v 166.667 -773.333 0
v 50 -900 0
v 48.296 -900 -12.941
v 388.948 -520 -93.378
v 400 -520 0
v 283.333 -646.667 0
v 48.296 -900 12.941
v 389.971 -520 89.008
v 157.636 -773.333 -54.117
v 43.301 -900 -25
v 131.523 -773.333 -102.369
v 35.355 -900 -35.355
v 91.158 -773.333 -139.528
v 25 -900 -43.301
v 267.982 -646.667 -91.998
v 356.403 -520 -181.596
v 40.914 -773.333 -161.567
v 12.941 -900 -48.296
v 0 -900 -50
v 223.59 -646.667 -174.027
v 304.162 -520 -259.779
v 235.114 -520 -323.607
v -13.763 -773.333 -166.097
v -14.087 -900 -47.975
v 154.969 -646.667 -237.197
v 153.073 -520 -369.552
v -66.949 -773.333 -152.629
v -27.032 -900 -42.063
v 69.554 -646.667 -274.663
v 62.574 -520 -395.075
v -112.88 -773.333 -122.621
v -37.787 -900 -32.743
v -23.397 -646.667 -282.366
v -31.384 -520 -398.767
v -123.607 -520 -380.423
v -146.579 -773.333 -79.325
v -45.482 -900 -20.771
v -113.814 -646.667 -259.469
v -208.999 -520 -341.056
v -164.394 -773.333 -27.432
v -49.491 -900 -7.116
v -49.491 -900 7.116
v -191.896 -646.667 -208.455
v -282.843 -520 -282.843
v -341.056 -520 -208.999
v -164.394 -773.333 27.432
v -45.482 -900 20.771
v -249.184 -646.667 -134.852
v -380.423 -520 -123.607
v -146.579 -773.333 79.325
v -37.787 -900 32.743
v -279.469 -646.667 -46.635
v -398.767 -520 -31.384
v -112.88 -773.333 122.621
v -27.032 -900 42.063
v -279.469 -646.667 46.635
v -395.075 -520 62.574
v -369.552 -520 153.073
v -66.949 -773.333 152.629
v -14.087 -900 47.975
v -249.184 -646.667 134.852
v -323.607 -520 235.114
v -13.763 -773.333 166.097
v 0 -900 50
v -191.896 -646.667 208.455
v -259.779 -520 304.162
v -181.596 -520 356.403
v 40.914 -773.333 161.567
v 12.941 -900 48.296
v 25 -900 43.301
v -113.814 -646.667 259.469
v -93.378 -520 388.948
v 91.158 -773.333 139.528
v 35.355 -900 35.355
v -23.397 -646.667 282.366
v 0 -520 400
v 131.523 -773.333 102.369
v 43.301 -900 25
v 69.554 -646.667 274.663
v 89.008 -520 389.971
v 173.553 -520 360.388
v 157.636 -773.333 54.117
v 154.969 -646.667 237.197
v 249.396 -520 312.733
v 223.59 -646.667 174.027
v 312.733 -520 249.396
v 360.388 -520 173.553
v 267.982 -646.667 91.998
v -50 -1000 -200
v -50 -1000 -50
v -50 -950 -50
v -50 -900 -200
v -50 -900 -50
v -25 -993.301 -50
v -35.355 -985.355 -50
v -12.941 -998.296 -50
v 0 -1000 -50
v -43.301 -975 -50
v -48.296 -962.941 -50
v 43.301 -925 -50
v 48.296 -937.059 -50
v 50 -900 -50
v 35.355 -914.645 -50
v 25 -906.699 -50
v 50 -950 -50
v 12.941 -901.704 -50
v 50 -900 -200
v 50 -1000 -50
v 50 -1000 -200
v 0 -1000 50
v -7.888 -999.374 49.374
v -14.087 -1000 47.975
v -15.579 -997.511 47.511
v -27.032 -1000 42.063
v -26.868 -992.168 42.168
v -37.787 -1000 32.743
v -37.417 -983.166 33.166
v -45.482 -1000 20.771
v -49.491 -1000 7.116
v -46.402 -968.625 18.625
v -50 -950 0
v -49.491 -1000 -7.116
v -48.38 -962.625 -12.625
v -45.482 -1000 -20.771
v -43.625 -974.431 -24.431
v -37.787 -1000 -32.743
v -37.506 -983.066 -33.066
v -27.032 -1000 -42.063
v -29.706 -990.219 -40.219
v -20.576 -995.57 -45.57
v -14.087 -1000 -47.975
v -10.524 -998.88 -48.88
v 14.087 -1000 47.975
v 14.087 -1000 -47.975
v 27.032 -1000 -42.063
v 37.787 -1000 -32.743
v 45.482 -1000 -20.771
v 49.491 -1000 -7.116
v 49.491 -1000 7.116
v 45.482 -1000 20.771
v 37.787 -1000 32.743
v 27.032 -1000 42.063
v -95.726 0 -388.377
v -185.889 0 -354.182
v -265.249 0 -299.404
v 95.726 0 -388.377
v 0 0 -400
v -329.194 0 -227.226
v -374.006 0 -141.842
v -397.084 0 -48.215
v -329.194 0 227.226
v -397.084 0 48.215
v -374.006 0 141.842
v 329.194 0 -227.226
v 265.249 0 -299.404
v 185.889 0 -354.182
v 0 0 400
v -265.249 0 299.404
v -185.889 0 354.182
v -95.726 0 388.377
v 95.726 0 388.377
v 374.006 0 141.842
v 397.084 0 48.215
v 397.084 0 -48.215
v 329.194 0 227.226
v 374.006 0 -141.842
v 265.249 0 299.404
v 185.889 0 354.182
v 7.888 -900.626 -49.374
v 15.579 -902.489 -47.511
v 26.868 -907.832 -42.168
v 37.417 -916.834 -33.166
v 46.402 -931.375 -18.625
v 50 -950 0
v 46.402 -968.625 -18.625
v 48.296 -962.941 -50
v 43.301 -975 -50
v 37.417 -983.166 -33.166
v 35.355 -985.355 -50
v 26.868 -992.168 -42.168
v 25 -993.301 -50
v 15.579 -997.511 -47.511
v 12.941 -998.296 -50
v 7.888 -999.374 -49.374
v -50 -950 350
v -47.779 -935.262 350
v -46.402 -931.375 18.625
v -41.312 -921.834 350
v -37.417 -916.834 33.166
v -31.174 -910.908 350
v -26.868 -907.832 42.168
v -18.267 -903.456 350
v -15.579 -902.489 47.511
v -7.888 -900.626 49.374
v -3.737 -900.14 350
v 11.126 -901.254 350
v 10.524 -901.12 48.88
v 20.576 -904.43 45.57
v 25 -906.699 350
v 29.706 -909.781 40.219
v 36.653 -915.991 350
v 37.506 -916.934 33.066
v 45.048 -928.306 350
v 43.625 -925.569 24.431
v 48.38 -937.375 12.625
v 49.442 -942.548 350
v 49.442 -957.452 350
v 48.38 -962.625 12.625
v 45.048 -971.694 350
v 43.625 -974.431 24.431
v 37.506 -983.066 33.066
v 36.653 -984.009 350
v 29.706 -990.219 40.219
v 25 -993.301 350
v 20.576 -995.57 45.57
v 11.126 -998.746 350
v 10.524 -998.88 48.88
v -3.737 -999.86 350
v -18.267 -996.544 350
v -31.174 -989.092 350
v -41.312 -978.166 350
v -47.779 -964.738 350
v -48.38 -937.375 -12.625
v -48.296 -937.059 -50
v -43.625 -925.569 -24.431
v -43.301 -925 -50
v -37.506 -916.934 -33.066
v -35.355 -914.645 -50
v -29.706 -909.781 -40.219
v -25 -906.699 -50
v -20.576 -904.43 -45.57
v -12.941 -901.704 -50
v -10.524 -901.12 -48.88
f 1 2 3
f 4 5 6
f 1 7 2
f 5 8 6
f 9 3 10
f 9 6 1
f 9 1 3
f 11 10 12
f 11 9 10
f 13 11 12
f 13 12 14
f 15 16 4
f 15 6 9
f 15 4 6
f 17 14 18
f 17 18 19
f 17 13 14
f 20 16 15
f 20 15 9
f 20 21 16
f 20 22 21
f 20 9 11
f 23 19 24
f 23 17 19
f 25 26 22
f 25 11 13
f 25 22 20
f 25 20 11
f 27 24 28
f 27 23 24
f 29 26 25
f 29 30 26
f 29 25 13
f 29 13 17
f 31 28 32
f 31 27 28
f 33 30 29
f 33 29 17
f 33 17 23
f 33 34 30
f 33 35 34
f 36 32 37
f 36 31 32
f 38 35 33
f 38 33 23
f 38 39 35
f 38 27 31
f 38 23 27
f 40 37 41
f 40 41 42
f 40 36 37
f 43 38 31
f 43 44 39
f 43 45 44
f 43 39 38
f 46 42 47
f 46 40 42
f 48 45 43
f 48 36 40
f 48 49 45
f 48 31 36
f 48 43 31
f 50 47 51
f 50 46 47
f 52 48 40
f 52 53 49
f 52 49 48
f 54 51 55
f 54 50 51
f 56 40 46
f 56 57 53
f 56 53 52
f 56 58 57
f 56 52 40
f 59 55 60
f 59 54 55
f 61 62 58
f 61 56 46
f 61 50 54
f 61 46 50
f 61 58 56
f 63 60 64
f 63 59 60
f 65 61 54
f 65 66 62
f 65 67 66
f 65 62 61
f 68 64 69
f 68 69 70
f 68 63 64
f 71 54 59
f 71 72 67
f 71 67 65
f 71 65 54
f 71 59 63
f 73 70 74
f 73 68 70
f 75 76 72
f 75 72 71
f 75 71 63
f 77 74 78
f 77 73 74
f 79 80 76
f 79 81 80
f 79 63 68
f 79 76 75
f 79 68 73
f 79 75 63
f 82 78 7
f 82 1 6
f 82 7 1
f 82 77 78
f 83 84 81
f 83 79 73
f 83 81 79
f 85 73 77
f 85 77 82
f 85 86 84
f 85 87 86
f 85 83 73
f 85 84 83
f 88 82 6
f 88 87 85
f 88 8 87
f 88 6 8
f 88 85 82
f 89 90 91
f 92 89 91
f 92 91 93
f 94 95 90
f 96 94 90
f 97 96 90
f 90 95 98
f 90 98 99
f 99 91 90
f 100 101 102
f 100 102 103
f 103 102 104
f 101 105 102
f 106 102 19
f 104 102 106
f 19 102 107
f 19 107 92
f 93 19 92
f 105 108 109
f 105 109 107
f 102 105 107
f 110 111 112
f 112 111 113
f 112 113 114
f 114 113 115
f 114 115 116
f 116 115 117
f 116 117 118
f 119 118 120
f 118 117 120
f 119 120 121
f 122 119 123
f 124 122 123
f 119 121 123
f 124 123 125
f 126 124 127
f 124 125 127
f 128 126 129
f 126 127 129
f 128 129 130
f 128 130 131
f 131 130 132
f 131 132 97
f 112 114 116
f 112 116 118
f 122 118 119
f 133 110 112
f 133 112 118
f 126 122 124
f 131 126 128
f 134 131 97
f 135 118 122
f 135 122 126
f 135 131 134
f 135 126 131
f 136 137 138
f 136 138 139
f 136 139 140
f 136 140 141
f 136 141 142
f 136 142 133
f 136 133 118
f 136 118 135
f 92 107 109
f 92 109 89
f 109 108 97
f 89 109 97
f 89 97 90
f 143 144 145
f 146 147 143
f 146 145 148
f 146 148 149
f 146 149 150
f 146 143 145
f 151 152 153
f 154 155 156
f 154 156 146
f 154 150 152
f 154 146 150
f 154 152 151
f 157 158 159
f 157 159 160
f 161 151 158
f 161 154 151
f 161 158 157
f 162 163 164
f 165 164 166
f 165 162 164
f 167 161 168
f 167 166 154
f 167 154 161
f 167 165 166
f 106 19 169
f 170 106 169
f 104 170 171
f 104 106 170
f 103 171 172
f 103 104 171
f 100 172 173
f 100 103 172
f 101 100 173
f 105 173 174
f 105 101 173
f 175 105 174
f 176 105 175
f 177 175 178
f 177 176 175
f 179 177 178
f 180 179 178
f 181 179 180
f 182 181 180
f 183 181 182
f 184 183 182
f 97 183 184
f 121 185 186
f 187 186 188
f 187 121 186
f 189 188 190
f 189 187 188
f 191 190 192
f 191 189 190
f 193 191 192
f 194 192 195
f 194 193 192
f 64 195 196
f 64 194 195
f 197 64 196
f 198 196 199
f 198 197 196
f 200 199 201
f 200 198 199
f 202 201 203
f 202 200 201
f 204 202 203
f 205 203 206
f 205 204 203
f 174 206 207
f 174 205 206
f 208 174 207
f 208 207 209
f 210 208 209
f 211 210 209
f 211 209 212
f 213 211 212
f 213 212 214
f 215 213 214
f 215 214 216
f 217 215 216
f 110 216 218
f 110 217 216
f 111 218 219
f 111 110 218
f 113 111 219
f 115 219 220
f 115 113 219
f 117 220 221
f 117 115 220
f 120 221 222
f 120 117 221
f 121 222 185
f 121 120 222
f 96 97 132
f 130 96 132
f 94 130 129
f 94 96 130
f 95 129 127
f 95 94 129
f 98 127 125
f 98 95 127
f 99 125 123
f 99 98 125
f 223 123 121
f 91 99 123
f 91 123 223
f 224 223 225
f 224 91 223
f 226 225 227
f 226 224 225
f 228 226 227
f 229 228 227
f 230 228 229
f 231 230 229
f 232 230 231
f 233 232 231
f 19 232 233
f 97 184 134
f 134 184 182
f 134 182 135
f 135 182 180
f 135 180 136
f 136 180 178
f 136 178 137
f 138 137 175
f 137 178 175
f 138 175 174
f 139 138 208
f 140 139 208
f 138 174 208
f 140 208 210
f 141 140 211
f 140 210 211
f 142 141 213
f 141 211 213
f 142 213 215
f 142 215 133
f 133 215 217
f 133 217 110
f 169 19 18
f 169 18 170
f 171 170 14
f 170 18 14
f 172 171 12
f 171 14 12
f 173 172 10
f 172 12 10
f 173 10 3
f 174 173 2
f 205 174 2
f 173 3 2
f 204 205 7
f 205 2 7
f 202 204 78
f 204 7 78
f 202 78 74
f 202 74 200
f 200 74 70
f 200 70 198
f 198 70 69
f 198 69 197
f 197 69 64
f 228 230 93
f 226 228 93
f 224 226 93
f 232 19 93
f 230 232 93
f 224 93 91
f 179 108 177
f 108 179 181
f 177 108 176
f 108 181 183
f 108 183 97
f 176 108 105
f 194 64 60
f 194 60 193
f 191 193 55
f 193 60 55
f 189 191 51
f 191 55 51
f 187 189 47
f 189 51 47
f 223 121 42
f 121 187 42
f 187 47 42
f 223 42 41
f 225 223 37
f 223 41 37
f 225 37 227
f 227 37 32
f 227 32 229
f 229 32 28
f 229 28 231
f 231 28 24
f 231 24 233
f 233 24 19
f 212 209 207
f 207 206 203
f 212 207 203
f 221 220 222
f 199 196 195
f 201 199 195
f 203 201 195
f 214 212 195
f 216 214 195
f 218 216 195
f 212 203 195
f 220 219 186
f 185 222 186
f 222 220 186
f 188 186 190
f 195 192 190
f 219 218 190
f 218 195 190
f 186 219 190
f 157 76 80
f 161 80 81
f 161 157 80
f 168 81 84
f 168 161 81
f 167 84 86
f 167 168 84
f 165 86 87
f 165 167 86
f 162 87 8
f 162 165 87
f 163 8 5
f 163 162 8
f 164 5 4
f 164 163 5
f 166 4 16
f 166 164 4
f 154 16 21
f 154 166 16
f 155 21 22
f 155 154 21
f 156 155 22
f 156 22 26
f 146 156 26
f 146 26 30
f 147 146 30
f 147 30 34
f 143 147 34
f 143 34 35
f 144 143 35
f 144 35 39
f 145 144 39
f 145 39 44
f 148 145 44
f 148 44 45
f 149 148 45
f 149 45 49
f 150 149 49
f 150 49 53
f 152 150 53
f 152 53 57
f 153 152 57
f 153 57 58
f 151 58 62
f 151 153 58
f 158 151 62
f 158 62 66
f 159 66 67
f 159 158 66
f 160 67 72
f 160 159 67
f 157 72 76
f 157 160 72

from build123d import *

# Parameters (mm, degrees)
CROQUIS1_R              = 400
SALIENTE_EXTRUIR1_DEPTH = 520
CROQUIS3_R              = 50
CROQUIS2_R              = 400
CROQUIS4_R              = 50
SALIENTE_EXTRUIR2_DEPTH = 100
CROQUIS5_R              = 50
SALIENTE_EXTRUIR3_DEPTH = 400
CROQUIS6_W              = 100
CROQUIS6_H              = 100
SALIENTE_EXTRUIR4_DEPTH = 150


with BuildPart() as part:
    # Croquis1 → Saliente-Extruir1 (new body)
    with BuildSketch(Plane(origin=(0, 0, 0), x_dir=(1, 0, 0), z_dir=(0, 1, 0))):
        with Locations(Location((0, 0, 0), (0, 0, 270))):
            Circle(CROQUIS1_R)
    extrude(amount=-SALIENTE_EXTRUIR1_DEPTH)

    # Croquis3 → Recubrir1 section 0
    with BuildSketch(Plane(origin=(0, -900, 0), x_dir=(1, 0, 0), z_dir=(0, 1, 0))):
        Circle(CROQUIS3_R)
    # Croquis2 → Recubrir1 section 1
    with BuildSketch(Plane.XZ.offset(520)):
        Circle(CROQUIS2_R)
    loft()

    # Croquis4 → Saliente-Extruir2 (add)
    with BuildSketch(Plane.XZ.offset(900)):
        with Locations(Location((0, 0, 0), (0, 0, 270))):
            Circle(CROQUIS4_R)
    extrude(amount=SALIENTE_EXTRUIR2_DEPTH)

    # Croquis5 → Saliente-Extruir3 (add)
    with BuildSketch(Plane(origin=(0, 0, -50), x_dir=(-1, 0, 0), z_dir=(0, 0, -1))):
        with Locations((0, -950)):
            Circle(CROQUIS5_R)
    extrude(amount=-SALIENTE_EXTRUIR3_DEPTH)

    # Croquis6 → Saliente-Extruir4 (add)
    with BuildSketch(Plane(origin=(0, 0, -50), x_dir=(-1, 0, 0), z_dir=(0, 0, -1))):
        with Locations((0, -950)):
            Rectangle(CROQUIS6_W, CROQUIS6_H)
    extrude(amount=SALIENTE_EXTRUIR4_DEPTH)


solid = part.part
